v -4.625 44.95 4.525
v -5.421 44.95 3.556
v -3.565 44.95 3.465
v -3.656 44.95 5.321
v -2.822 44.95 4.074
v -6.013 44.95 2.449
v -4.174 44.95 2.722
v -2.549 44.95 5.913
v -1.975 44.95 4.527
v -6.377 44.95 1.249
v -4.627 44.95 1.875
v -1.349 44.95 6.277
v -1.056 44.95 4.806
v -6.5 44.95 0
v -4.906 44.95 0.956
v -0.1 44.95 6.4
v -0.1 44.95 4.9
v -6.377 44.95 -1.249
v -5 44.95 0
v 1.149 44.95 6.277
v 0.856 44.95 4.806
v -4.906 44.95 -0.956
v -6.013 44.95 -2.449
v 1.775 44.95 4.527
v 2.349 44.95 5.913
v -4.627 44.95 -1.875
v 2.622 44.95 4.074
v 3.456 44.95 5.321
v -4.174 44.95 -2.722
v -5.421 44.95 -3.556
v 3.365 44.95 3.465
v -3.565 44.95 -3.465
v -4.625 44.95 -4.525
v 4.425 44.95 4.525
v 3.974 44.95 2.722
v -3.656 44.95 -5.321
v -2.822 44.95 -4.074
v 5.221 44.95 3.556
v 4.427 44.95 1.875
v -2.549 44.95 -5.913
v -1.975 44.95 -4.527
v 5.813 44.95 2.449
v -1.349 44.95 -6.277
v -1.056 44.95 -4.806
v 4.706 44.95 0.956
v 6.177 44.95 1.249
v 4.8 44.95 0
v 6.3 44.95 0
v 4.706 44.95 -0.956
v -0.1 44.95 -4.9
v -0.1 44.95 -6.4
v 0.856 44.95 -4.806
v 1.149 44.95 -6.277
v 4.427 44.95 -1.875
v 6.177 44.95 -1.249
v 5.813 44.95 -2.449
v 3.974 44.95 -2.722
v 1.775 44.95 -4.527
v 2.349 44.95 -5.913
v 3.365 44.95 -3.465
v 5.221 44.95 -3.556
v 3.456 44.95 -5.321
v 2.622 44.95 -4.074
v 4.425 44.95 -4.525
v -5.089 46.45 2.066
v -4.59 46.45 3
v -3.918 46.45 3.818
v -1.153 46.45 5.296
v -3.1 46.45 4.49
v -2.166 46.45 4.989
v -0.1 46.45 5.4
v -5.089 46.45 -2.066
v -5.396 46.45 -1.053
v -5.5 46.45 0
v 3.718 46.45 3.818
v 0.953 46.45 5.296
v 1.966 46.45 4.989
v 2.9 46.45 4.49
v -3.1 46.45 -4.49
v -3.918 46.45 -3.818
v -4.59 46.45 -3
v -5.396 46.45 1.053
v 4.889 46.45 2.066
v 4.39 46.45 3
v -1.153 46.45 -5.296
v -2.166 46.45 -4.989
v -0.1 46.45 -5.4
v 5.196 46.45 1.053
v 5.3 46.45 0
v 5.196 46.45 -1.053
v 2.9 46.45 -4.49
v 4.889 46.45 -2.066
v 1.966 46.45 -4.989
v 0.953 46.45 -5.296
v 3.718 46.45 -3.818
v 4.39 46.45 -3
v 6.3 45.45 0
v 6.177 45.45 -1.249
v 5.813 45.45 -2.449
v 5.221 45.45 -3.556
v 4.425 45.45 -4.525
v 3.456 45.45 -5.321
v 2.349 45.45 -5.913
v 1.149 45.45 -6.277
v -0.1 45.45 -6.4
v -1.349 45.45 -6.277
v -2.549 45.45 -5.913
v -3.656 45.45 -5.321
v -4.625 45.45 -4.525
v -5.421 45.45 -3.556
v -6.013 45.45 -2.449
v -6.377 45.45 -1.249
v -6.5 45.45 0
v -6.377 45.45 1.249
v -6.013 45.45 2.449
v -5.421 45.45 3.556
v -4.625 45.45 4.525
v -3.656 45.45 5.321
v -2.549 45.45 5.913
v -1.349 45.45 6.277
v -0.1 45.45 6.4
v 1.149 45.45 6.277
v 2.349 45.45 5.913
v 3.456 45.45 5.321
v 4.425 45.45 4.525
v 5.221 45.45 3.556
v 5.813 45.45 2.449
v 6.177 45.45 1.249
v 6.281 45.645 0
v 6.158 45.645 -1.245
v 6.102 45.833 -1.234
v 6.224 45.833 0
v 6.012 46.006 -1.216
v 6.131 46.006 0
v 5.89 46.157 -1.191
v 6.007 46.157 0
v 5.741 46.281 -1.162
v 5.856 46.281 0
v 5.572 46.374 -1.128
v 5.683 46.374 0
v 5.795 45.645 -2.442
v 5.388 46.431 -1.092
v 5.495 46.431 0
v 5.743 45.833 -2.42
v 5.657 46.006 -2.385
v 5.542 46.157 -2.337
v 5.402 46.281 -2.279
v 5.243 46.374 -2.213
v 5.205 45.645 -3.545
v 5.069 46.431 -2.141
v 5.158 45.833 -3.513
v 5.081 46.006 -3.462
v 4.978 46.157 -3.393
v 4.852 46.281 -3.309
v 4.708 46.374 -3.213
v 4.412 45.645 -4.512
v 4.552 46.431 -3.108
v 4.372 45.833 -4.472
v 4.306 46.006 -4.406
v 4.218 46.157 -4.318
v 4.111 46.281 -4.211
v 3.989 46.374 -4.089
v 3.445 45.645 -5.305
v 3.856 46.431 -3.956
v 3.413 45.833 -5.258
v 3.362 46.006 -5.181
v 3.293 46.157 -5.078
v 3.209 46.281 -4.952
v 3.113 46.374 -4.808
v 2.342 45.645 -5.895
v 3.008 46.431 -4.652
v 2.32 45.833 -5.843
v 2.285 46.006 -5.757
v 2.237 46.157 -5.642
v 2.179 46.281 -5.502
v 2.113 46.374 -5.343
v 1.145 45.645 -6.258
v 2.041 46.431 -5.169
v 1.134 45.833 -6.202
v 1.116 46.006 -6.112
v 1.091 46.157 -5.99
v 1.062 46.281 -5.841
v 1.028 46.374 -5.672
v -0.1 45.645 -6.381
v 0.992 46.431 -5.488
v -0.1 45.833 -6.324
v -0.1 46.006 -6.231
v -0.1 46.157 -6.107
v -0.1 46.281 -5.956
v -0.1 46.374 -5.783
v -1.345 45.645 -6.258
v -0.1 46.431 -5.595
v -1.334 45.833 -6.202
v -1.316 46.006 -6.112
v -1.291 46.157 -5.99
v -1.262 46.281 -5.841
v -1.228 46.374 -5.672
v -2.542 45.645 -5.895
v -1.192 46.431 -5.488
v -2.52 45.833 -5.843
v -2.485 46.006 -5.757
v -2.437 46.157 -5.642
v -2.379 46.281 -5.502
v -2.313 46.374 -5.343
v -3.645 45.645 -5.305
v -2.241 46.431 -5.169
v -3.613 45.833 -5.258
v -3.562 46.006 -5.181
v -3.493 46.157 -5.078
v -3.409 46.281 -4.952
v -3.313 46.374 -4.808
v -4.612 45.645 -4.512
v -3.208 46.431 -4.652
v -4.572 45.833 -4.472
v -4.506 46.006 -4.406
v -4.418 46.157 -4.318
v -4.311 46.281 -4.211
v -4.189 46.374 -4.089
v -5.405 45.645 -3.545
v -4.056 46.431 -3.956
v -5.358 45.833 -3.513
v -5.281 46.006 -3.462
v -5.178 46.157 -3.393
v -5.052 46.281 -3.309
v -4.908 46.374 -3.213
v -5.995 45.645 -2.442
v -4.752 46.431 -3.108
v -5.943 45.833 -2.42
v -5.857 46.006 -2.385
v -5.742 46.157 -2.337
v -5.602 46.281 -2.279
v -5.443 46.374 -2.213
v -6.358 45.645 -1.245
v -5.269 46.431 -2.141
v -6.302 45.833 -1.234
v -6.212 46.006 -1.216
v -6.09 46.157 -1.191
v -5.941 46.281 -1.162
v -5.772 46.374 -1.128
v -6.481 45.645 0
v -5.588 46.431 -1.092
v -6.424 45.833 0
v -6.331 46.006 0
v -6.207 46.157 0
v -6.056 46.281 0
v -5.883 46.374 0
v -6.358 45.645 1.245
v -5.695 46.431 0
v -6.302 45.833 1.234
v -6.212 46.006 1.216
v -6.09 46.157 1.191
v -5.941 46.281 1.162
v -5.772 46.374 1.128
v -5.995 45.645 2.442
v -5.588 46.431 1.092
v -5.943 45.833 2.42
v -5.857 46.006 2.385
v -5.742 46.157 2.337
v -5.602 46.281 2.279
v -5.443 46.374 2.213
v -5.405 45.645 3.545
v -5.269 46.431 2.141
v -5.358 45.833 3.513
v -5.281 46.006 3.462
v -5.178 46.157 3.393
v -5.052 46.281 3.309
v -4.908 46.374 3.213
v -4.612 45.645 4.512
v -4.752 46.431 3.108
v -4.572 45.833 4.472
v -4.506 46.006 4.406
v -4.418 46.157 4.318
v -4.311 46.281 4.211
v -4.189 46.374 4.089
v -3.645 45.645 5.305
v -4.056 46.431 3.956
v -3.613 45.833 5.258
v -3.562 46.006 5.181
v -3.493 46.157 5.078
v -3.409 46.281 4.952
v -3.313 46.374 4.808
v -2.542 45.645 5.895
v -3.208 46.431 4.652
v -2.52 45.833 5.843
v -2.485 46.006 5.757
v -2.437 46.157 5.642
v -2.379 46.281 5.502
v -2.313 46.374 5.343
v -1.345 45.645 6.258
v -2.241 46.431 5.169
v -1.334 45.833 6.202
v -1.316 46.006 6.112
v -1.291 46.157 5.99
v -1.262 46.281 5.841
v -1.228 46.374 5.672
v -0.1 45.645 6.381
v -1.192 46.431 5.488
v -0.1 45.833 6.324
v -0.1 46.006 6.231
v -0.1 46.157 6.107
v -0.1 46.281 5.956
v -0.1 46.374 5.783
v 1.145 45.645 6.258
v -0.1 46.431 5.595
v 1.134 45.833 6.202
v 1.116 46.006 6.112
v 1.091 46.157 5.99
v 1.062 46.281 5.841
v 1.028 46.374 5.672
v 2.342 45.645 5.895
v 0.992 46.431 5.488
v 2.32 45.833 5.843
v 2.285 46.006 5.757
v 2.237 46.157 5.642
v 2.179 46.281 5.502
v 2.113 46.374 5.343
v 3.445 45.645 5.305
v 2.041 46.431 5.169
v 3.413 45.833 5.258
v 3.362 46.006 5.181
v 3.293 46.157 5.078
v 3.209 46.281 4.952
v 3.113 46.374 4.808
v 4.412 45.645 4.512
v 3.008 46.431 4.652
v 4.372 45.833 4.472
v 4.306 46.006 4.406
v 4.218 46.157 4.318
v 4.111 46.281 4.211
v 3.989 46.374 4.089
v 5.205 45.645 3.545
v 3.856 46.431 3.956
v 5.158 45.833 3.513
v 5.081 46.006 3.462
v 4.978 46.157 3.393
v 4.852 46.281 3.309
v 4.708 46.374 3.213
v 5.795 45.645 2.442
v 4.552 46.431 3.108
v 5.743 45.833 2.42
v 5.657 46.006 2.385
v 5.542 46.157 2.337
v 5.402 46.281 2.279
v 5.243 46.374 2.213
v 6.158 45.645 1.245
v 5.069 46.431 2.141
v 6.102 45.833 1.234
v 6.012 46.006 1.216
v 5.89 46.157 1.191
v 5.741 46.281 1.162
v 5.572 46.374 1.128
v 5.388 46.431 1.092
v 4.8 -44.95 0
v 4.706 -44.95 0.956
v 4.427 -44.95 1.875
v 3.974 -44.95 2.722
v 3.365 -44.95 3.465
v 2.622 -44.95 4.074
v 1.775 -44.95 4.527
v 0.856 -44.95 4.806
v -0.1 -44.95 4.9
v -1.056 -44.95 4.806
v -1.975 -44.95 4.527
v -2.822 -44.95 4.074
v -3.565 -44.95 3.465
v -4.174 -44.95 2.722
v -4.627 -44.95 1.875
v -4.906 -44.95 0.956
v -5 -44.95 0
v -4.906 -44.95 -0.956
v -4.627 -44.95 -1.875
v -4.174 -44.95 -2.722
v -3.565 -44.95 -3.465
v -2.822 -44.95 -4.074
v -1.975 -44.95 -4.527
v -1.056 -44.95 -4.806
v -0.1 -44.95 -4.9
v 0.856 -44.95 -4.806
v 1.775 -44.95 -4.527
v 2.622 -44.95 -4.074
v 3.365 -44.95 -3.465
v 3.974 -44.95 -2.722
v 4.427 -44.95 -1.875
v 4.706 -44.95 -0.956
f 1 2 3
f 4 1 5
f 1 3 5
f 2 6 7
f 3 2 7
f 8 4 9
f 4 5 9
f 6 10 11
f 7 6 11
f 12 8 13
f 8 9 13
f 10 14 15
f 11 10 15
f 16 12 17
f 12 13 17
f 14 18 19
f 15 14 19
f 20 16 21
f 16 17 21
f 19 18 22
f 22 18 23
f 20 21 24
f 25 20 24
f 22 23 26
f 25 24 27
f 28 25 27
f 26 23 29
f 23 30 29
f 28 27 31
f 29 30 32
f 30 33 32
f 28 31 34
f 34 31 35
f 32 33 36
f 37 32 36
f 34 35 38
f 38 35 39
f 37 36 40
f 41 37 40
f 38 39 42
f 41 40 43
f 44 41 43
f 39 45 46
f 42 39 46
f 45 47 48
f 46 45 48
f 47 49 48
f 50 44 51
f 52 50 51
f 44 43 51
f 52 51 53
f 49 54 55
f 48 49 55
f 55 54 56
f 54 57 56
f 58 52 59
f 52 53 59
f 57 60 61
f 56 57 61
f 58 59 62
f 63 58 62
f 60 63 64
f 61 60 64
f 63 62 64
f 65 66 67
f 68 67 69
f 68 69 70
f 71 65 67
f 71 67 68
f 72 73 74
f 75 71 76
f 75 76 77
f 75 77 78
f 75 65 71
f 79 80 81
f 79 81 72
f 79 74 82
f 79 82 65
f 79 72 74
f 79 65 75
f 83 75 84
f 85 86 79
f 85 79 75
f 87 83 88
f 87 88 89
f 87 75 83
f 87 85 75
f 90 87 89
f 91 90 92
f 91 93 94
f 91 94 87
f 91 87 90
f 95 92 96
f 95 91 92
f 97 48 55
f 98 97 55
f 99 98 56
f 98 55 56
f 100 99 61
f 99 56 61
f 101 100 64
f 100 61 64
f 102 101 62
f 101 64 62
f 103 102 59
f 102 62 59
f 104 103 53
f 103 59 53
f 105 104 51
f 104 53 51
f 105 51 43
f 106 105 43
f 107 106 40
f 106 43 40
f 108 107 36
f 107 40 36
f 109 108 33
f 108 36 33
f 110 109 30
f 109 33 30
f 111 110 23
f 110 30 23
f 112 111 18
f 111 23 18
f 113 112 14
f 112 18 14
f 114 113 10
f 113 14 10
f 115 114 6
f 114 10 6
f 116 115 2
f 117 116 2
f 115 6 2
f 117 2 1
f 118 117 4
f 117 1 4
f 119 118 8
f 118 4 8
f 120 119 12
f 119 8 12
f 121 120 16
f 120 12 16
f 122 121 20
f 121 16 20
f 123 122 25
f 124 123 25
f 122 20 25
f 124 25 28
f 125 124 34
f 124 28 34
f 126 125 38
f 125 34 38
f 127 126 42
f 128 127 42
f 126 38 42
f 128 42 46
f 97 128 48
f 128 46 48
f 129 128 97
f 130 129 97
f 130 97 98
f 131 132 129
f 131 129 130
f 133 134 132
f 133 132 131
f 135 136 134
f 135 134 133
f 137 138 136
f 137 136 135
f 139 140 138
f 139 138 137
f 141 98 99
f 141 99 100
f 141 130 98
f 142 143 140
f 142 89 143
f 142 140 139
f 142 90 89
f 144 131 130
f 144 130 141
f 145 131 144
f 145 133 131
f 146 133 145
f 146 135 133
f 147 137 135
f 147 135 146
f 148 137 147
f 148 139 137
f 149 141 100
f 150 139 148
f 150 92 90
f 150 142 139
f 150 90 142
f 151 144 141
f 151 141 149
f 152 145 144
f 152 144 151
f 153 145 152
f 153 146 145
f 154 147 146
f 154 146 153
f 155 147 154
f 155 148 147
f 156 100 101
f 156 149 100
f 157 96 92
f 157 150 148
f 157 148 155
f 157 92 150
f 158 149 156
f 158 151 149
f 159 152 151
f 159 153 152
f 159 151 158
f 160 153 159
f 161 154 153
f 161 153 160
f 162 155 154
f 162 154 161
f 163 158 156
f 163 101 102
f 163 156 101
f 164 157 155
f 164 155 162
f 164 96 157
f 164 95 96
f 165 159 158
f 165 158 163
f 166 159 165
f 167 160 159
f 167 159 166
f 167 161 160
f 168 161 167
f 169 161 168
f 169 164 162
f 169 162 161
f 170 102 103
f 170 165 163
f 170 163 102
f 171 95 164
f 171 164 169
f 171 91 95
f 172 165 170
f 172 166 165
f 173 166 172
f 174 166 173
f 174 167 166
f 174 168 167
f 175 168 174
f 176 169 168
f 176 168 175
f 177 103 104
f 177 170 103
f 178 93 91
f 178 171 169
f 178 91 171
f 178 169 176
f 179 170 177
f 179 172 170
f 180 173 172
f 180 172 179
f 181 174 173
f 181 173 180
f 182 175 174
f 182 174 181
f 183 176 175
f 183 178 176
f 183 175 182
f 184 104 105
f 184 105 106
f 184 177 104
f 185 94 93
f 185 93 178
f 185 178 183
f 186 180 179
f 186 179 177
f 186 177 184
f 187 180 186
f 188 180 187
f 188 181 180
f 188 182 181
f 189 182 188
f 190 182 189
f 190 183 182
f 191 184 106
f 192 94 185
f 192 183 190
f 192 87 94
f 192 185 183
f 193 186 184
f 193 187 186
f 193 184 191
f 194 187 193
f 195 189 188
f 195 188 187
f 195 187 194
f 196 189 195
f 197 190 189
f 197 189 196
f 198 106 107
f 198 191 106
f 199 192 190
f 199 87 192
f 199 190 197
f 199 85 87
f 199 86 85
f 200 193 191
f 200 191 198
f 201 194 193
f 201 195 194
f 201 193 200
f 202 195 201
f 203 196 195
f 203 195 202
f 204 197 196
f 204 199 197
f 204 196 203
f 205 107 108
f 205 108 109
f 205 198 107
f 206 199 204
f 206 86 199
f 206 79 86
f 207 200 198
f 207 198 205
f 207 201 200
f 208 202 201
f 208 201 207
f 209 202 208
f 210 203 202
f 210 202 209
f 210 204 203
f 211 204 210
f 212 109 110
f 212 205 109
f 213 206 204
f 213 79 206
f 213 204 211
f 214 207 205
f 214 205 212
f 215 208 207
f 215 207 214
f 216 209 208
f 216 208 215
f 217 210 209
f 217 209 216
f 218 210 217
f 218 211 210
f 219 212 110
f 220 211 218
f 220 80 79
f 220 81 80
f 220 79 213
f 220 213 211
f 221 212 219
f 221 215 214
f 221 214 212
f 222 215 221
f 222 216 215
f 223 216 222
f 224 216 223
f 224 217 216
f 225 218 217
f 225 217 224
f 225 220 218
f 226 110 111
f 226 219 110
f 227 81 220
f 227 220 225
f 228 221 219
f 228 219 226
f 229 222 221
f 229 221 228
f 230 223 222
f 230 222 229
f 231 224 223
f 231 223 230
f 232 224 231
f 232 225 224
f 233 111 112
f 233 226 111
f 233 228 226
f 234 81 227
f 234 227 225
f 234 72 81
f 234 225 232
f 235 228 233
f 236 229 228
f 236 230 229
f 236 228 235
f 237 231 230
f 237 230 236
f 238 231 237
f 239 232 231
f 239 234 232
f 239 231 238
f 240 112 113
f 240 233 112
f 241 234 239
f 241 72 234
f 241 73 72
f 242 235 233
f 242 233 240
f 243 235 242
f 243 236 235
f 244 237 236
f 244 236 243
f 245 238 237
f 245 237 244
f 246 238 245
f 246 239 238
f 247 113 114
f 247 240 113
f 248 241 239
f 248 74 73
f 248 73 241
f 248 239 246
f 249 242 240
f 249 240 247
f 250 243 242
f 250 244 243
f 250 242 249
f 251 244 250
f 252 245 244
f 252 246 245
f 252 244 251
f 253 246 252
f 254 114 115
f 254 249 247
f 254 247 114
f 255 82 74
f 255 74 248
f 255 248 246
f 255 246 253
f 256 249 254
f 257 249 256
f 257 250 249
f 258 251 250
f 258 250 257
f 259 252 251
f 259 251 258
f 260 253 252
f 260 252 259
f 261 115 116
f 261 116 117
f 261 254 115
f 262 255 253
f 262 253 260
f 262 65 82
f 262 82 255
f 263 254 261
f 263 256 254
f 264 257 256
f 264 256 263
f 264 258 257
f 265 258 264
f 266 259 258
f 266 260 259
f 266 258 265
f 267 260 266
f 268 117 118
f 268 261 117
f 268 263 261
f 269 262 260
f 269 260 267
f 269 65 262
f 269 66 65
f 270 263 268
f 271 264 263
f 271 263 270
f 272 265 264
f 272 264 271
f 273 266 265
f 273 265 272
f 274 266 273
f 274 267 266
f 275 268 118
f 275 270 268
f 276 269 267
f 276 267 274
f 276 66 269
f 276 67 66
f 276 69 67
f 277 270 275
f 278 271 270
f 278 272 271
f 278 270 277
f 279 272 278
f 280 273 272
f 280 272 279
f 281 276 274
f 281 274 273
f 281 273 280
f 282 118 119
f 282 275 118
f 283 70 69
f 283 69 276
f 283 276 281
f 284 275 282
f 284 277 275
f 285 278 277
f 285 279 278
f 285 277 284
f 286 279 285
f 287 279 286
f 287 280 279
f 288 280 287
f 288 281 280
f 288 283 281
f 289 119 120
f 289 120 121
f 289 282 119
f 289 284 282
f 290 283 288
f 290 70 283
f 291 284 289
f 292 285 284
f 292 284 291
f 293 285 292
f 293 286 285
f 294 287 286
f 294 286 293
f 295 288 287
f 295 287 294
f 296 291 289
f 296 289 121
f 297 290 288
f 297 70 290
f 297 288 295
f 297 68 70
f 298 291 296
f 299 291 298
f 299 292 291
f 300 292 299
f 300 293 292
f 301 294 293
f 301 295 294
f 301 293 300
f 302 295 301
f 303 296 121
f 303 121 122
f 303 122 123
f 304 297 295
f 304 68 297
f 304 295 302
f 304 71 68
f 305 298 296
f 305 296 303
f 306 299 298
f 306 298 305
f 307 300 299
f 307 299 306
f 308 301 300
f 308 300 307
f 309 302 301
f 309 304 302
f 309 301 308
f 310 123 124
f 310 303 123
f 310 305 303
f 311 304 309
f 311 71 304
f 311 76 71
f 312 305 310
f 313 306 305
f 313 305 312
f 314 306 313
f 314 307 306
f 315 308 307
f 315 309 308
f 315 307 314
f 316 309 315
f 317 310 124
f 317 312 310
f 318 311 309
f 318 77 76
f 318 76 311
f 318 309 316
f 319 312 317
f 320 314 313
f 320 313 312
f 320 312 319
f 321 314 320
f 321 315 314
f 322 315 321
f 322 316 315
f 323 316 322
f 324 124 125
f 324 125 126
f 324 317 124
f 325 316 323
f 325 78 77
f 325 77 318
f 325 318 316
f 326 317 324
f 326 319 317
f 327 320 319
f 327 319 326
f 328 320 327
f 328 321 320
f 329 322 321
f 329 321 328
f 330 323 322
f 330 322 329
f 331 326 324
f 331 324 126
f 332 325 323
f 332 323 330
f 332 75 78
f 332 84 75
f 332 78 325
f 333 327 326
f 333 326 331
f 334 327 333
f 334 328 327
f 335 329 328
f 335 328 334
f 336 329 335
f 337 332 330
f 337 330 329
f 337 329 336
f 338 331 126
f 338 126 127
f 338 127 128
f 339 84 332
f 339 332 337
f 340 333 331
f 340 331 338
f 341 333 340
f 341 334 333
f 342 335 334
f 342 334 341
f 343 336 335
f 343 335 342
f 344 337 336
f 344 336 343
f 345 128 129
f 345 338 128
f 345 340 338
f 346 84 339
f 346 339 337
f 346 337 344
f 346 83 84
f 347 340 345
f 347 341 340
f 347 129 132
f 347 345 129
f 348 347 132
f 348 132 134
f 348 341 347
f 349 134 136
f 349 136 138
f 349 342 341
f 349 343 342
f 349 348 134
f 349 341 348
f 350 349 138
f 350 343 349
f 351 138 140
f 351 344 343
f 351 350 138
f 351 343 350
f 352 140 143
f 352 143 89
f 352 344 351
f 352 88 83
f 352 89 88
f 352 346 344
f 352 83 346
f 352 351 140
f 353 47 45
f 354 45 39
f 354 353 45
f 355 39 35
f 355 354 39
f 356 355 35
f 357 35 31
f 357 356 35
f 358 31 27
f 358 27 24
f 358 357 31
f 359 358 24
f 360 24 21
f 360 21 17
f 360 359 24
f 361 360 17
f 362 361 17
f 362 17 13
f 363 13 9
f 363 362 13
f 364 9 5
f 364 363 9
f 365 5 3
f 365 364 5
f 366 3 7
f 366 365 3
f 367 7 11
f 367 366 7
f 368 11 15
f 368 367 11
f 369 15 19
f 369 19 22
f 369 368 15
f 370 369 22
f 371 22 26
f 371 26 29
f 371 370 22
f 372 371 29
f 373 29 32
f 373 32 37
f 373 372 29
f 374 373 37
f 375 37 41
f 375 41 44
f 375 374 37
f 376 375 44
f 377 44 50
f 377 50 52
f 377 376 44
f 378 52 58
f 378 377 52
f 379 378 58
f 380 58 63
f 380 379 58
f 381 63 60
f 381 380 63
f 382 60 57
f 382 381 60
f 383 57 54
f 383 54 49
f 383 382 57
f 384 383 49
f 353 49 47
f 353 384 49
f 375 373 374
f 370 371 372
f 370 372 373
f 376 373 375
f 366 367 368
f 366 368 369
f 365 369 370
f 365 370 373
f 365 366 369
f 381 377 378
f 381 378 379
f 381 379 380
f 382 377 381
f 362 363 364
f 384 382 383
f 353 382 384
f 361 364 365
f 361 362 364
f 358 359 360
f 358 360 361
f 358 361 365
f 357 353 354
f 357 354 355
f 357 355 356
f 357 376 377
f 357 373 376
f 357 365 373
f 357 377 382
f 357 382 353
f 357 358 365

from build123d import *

# Parameters (mm, degrees)
SKETCH011_R       = 4.9
PAD002_DEPTH      = 44.95
CYLINDER003_R     = 6.4
CYLINDER003_DEPTH = 1.5
FILLET_R          = 1


with BuildPart() as part:
    # Sketch011 → Pad002 (new body, symmetric)
    with BuildSketch(Plane.XZ):
        with Locations((-0.1, 0)):
            Circle(SKETCH011_R)
    extrude(amount=PAD002_DEPTH, both=True)

    # Cylinder003 → Cylinder003 (join)
    with BuildSketch(Plane(origin=(-0.1, 44.95, 0), x_dir=(1, 0, 0), z_dir=(0, 1, 0))):
        Circle(CYLINDER003_R)
    extrude(amount=CYLINDER003_DEPTH)

    # Fillet
    fillet_edges = [part.edges().sort_by_distance(p)[0] for p in [
        (-6.5, 46.45, 0),
    ]]
    fillet(fillet_edges, radius=FILLET_R)


solid = part.part
